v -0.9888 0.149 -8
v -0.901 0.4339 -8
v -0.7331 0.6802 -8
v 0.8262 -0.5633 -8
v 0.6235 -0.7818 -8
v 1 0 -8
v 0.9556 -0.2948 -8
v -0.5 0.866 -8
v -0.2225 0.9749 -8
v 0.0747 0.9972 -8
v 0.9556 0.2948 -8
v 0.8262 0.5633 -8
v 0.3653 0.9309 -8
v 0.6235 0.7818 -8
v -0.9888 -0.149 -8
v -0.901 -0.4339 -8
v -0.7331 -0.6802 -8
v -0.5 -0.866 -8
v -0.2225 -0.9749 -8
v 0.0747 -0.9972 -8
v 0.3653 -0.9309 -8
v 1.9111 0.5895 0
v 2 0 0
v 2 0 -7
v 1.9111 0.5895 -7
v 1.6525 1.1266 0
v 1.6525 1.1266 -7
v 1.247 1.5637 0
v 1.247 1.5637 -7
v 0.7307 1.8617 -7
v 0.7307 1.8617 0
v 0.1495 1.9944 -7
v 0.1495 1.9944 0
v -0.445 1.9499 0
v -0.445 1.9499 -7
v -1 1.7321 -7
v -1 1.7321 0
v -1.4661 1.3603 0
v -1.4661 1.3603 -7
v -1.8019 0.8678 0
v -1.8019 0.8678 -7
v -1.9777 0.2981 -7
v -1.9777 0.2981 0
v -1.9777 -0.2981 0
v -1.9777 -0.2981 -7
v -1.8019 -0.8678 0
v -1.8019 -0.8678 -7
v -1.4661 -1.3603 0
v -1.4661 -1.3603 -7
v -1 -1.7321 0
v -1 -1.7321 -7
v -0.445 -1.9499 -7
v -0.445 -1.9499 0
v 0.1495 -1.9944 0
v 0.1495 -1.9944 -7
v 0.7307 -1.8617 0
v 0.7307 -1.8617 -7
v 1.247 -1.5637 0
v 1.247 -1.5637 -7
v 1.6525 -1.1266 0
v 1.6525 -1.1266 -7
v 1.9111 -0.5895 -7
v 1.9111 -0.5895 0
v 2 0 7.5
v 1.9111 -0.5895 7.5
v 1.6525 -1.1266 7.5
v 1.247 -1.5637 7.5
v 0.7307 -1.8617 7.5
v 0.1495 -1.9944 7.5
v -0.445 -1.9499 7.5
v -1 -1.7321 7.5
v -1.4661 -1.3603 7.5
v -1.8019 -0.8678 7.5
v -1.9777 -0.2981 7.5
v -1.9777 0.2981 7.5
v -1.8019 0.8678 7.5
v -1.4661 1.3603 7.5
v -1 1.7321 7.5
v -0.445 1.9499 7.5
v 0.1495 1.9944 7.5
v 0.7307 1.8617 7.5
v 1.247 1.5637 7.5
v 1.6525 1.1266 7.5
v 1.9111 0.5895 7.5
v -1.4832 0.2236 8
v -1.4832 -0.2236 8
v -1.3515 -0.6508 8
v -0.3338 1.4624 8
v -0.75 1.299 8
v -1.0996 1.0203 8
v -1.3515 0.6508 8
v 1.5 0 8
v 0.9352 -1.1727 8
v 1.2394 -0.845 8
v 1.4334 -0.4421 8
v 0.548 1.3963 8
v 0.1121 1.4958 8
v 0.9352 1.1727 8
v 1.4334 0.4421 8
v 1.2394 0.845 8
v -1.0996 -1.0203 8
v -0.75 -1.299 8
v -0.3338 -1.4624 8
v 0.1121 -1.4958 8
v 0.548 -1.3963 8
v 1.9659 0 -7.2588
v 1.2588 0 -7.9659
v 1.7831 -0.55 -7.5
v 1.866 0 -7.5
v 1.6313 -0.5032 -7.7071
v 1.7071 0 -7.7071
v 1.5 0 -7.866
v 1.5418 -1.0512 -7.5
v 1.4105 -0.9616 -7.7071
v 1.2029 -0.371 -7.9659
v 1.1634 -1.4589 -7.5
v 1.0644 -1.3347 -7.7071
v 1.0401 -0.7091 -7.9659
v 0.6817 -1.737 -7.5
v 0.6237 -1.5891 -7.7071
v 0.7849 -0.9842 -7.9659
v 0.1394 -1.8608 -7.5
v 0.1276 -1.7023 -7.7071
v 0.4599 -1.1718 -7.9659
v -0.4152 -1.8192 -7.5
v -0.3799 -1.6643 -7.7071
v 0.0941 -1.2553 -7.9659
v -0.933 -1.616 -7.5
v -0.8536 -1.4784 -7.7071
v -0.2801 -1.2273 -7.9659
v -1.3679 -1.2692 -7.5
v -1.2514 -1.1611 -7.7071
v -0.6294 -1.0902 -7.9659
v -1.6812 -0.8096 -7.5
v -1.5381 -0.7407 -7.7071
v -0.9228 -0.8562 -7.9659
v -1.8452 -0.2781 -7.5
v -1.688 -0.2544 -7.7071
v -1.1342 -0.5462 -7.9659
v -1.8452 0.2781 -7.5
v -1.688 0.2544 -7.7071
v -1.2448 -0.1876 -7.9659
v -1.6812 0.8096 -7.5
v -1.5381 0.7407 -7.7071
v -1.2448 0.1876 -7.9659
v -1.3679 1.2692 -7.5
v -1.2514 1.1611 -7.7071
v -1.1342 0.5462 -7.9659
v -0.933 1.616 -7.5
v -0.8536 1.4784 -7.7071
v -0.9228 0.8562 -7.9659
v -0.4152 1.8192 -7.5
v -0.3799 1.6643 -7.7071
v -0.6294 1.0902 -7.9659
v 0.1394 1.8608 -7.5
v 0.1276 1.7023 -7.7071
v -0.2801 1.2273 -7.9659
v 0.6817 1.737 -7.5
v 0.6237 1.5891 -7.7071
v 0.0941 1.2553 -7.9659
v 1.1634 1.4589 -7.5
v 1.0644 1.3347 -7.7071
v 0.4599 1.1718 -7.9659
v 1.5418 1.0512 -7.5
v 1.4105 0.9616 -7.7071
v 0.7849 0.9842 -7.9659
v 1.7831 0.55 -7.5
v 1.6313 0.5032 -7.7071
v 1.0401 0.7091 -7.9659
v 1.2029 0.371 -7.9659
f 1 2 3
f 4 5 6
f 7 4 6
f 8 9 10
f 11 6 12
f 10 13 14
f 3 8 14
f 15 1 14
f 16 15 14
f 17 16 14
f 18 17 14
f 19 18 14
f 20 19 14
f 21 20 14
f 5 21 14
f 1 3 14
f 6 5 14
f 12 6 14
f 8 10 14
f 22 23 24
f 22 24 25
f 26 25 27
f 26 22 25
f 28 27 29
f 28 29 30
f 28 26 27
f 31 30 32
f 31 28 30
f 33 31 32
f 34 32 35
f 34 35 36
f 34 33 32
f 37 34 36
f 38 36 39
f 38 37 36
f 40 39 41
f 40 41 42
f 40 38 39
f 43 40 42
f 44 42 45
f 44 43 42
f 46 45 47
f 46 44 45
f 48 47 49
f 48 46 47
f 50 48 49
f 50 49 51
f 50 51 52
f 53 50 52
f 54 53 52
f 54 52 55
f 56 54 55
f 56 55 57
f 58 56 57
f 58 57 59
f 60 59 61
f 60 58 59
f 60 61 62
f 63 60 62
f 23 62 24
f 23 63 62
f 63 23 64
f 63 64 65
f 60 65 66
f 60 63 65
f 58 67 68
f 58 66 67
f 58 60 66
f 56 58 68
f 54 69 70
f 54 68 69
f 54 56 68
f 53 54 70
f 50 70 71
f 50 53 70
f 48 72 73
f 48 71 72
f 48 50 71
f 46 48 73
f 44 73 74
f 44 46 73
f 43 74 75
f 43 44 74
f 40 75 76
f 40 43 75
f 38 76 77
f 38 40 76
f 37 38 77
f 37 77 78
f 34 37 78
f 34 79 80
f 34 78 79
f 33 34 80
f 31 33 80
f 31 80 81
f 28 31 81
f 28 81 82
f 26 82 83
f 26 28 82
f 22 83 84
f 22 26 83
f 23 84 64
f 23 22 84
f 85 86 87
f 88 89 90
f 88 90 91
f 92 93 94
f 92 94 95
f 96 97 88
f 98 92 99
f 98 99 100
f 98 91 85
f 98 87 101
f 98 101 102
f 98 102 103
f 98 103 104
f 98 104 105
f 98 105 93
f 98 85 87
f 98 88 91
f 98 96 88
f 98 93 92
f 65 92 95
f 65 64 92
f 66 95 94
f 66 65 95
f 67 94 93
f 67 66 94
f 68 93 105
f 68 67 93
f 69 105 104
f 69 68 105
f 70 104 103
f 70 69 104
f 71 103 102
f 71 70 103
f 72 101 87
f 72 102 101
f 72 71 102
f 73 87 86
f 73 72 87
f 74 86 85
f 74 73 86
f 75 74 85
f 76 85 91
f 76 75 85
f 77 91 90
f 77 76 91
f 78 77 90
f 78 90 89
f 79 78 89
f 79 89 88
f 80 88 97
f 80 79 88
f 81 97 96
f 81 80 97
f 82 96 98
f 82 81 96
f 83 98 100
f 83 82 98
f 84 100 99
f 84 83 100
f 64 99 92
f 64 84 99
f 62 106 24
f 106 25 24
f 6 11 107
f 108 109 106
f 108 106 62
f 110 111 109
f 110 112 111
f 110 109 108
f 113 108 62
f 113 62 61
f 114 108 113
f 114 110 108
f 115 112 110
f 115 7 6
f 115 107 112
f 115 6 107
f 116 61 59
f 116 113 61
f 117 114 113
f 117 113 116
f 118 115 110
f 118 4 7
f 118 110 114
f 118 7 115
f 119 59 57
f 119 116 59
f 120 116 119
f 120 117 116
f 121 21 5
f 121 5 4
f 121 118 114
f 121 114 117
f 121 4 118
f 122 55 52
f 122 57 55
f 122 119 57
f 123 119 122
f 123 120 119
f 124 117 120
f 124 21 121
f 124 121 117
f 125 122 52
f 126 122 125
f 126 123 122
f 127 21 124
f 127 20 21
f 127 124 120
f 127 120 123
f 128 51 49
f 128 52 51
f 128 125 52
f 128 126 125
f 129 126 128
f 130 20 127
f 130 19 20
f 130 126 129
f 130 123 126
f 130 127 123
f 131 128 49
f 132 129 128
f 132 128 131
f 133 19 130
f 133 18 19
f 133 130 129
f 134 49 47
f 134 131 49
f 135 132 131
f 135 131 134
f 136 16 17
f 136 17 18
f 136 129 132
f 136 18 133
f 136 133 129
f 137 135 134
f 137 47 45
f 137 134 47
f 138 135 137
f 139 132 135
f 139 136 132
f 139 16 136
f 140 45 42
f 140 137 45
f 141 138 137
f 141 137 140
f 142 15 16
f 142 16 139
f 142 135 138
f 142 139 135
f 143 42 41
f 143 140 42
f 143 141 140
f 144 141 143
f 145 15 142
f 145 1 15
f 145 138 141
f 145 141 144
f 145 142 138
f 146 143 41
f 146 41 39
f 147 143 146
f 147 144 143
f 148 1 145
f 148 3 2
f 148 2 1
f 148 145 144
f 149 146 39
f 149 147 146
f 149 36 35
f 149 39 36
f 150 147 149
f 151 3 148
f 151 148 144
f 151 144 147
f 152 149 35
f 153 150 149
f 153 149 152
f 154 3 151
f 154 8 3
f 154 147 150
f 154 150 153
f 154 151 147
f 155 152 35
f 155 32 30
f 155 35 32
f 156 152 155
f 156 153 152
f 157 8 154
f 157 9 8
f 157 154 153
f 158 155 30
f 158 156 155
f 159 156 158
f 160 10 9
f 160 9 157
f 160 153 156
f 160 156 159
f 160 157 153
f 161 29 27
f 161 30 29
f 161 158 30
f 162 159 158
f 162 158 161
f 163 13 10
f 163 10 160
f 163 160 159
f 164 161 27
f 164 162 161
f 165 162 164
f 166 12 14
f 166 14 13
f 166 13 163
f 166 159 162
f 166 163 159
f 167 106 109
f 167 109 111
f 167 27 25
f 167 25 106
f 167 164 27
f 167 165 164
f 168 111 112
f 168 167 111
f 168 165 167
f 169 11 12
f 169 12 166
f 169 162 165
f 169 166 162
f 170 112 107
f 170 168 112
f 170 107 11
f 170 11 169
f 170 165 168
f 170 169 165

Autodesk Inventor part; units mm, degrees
ref_plane "YZ Plane" through (0, 0, 0) normal (1, 0, 0) x (0, 1, 0)
ref_plane "XZ Plane" through (0, 0, 0) normal (0, 1, 0) x (-1, 0, 0)
ref_plane "XY Plane" through (0, 0, 0) normal (0, 0, 1) x (1, 0, 0)
sketch "Sketch1" plane through (0, 0, 0) normal (0, 0, 1) x (1, 0, 0)
  circle A0 centre (0, 0) radius 2
  dimension "d0" = 4
extrude "Extrusion1" add sketch "Sketch1" along normal mid plane 16
fillet "Fillet1" radius 1 1 edges at (-2, 0, -8)
chamfer "Chamfer1" distance 0.5 angle 45 1 edges at (-2, 0, 8)
properties part number "DOWEL,M4X16" material "Steel"
